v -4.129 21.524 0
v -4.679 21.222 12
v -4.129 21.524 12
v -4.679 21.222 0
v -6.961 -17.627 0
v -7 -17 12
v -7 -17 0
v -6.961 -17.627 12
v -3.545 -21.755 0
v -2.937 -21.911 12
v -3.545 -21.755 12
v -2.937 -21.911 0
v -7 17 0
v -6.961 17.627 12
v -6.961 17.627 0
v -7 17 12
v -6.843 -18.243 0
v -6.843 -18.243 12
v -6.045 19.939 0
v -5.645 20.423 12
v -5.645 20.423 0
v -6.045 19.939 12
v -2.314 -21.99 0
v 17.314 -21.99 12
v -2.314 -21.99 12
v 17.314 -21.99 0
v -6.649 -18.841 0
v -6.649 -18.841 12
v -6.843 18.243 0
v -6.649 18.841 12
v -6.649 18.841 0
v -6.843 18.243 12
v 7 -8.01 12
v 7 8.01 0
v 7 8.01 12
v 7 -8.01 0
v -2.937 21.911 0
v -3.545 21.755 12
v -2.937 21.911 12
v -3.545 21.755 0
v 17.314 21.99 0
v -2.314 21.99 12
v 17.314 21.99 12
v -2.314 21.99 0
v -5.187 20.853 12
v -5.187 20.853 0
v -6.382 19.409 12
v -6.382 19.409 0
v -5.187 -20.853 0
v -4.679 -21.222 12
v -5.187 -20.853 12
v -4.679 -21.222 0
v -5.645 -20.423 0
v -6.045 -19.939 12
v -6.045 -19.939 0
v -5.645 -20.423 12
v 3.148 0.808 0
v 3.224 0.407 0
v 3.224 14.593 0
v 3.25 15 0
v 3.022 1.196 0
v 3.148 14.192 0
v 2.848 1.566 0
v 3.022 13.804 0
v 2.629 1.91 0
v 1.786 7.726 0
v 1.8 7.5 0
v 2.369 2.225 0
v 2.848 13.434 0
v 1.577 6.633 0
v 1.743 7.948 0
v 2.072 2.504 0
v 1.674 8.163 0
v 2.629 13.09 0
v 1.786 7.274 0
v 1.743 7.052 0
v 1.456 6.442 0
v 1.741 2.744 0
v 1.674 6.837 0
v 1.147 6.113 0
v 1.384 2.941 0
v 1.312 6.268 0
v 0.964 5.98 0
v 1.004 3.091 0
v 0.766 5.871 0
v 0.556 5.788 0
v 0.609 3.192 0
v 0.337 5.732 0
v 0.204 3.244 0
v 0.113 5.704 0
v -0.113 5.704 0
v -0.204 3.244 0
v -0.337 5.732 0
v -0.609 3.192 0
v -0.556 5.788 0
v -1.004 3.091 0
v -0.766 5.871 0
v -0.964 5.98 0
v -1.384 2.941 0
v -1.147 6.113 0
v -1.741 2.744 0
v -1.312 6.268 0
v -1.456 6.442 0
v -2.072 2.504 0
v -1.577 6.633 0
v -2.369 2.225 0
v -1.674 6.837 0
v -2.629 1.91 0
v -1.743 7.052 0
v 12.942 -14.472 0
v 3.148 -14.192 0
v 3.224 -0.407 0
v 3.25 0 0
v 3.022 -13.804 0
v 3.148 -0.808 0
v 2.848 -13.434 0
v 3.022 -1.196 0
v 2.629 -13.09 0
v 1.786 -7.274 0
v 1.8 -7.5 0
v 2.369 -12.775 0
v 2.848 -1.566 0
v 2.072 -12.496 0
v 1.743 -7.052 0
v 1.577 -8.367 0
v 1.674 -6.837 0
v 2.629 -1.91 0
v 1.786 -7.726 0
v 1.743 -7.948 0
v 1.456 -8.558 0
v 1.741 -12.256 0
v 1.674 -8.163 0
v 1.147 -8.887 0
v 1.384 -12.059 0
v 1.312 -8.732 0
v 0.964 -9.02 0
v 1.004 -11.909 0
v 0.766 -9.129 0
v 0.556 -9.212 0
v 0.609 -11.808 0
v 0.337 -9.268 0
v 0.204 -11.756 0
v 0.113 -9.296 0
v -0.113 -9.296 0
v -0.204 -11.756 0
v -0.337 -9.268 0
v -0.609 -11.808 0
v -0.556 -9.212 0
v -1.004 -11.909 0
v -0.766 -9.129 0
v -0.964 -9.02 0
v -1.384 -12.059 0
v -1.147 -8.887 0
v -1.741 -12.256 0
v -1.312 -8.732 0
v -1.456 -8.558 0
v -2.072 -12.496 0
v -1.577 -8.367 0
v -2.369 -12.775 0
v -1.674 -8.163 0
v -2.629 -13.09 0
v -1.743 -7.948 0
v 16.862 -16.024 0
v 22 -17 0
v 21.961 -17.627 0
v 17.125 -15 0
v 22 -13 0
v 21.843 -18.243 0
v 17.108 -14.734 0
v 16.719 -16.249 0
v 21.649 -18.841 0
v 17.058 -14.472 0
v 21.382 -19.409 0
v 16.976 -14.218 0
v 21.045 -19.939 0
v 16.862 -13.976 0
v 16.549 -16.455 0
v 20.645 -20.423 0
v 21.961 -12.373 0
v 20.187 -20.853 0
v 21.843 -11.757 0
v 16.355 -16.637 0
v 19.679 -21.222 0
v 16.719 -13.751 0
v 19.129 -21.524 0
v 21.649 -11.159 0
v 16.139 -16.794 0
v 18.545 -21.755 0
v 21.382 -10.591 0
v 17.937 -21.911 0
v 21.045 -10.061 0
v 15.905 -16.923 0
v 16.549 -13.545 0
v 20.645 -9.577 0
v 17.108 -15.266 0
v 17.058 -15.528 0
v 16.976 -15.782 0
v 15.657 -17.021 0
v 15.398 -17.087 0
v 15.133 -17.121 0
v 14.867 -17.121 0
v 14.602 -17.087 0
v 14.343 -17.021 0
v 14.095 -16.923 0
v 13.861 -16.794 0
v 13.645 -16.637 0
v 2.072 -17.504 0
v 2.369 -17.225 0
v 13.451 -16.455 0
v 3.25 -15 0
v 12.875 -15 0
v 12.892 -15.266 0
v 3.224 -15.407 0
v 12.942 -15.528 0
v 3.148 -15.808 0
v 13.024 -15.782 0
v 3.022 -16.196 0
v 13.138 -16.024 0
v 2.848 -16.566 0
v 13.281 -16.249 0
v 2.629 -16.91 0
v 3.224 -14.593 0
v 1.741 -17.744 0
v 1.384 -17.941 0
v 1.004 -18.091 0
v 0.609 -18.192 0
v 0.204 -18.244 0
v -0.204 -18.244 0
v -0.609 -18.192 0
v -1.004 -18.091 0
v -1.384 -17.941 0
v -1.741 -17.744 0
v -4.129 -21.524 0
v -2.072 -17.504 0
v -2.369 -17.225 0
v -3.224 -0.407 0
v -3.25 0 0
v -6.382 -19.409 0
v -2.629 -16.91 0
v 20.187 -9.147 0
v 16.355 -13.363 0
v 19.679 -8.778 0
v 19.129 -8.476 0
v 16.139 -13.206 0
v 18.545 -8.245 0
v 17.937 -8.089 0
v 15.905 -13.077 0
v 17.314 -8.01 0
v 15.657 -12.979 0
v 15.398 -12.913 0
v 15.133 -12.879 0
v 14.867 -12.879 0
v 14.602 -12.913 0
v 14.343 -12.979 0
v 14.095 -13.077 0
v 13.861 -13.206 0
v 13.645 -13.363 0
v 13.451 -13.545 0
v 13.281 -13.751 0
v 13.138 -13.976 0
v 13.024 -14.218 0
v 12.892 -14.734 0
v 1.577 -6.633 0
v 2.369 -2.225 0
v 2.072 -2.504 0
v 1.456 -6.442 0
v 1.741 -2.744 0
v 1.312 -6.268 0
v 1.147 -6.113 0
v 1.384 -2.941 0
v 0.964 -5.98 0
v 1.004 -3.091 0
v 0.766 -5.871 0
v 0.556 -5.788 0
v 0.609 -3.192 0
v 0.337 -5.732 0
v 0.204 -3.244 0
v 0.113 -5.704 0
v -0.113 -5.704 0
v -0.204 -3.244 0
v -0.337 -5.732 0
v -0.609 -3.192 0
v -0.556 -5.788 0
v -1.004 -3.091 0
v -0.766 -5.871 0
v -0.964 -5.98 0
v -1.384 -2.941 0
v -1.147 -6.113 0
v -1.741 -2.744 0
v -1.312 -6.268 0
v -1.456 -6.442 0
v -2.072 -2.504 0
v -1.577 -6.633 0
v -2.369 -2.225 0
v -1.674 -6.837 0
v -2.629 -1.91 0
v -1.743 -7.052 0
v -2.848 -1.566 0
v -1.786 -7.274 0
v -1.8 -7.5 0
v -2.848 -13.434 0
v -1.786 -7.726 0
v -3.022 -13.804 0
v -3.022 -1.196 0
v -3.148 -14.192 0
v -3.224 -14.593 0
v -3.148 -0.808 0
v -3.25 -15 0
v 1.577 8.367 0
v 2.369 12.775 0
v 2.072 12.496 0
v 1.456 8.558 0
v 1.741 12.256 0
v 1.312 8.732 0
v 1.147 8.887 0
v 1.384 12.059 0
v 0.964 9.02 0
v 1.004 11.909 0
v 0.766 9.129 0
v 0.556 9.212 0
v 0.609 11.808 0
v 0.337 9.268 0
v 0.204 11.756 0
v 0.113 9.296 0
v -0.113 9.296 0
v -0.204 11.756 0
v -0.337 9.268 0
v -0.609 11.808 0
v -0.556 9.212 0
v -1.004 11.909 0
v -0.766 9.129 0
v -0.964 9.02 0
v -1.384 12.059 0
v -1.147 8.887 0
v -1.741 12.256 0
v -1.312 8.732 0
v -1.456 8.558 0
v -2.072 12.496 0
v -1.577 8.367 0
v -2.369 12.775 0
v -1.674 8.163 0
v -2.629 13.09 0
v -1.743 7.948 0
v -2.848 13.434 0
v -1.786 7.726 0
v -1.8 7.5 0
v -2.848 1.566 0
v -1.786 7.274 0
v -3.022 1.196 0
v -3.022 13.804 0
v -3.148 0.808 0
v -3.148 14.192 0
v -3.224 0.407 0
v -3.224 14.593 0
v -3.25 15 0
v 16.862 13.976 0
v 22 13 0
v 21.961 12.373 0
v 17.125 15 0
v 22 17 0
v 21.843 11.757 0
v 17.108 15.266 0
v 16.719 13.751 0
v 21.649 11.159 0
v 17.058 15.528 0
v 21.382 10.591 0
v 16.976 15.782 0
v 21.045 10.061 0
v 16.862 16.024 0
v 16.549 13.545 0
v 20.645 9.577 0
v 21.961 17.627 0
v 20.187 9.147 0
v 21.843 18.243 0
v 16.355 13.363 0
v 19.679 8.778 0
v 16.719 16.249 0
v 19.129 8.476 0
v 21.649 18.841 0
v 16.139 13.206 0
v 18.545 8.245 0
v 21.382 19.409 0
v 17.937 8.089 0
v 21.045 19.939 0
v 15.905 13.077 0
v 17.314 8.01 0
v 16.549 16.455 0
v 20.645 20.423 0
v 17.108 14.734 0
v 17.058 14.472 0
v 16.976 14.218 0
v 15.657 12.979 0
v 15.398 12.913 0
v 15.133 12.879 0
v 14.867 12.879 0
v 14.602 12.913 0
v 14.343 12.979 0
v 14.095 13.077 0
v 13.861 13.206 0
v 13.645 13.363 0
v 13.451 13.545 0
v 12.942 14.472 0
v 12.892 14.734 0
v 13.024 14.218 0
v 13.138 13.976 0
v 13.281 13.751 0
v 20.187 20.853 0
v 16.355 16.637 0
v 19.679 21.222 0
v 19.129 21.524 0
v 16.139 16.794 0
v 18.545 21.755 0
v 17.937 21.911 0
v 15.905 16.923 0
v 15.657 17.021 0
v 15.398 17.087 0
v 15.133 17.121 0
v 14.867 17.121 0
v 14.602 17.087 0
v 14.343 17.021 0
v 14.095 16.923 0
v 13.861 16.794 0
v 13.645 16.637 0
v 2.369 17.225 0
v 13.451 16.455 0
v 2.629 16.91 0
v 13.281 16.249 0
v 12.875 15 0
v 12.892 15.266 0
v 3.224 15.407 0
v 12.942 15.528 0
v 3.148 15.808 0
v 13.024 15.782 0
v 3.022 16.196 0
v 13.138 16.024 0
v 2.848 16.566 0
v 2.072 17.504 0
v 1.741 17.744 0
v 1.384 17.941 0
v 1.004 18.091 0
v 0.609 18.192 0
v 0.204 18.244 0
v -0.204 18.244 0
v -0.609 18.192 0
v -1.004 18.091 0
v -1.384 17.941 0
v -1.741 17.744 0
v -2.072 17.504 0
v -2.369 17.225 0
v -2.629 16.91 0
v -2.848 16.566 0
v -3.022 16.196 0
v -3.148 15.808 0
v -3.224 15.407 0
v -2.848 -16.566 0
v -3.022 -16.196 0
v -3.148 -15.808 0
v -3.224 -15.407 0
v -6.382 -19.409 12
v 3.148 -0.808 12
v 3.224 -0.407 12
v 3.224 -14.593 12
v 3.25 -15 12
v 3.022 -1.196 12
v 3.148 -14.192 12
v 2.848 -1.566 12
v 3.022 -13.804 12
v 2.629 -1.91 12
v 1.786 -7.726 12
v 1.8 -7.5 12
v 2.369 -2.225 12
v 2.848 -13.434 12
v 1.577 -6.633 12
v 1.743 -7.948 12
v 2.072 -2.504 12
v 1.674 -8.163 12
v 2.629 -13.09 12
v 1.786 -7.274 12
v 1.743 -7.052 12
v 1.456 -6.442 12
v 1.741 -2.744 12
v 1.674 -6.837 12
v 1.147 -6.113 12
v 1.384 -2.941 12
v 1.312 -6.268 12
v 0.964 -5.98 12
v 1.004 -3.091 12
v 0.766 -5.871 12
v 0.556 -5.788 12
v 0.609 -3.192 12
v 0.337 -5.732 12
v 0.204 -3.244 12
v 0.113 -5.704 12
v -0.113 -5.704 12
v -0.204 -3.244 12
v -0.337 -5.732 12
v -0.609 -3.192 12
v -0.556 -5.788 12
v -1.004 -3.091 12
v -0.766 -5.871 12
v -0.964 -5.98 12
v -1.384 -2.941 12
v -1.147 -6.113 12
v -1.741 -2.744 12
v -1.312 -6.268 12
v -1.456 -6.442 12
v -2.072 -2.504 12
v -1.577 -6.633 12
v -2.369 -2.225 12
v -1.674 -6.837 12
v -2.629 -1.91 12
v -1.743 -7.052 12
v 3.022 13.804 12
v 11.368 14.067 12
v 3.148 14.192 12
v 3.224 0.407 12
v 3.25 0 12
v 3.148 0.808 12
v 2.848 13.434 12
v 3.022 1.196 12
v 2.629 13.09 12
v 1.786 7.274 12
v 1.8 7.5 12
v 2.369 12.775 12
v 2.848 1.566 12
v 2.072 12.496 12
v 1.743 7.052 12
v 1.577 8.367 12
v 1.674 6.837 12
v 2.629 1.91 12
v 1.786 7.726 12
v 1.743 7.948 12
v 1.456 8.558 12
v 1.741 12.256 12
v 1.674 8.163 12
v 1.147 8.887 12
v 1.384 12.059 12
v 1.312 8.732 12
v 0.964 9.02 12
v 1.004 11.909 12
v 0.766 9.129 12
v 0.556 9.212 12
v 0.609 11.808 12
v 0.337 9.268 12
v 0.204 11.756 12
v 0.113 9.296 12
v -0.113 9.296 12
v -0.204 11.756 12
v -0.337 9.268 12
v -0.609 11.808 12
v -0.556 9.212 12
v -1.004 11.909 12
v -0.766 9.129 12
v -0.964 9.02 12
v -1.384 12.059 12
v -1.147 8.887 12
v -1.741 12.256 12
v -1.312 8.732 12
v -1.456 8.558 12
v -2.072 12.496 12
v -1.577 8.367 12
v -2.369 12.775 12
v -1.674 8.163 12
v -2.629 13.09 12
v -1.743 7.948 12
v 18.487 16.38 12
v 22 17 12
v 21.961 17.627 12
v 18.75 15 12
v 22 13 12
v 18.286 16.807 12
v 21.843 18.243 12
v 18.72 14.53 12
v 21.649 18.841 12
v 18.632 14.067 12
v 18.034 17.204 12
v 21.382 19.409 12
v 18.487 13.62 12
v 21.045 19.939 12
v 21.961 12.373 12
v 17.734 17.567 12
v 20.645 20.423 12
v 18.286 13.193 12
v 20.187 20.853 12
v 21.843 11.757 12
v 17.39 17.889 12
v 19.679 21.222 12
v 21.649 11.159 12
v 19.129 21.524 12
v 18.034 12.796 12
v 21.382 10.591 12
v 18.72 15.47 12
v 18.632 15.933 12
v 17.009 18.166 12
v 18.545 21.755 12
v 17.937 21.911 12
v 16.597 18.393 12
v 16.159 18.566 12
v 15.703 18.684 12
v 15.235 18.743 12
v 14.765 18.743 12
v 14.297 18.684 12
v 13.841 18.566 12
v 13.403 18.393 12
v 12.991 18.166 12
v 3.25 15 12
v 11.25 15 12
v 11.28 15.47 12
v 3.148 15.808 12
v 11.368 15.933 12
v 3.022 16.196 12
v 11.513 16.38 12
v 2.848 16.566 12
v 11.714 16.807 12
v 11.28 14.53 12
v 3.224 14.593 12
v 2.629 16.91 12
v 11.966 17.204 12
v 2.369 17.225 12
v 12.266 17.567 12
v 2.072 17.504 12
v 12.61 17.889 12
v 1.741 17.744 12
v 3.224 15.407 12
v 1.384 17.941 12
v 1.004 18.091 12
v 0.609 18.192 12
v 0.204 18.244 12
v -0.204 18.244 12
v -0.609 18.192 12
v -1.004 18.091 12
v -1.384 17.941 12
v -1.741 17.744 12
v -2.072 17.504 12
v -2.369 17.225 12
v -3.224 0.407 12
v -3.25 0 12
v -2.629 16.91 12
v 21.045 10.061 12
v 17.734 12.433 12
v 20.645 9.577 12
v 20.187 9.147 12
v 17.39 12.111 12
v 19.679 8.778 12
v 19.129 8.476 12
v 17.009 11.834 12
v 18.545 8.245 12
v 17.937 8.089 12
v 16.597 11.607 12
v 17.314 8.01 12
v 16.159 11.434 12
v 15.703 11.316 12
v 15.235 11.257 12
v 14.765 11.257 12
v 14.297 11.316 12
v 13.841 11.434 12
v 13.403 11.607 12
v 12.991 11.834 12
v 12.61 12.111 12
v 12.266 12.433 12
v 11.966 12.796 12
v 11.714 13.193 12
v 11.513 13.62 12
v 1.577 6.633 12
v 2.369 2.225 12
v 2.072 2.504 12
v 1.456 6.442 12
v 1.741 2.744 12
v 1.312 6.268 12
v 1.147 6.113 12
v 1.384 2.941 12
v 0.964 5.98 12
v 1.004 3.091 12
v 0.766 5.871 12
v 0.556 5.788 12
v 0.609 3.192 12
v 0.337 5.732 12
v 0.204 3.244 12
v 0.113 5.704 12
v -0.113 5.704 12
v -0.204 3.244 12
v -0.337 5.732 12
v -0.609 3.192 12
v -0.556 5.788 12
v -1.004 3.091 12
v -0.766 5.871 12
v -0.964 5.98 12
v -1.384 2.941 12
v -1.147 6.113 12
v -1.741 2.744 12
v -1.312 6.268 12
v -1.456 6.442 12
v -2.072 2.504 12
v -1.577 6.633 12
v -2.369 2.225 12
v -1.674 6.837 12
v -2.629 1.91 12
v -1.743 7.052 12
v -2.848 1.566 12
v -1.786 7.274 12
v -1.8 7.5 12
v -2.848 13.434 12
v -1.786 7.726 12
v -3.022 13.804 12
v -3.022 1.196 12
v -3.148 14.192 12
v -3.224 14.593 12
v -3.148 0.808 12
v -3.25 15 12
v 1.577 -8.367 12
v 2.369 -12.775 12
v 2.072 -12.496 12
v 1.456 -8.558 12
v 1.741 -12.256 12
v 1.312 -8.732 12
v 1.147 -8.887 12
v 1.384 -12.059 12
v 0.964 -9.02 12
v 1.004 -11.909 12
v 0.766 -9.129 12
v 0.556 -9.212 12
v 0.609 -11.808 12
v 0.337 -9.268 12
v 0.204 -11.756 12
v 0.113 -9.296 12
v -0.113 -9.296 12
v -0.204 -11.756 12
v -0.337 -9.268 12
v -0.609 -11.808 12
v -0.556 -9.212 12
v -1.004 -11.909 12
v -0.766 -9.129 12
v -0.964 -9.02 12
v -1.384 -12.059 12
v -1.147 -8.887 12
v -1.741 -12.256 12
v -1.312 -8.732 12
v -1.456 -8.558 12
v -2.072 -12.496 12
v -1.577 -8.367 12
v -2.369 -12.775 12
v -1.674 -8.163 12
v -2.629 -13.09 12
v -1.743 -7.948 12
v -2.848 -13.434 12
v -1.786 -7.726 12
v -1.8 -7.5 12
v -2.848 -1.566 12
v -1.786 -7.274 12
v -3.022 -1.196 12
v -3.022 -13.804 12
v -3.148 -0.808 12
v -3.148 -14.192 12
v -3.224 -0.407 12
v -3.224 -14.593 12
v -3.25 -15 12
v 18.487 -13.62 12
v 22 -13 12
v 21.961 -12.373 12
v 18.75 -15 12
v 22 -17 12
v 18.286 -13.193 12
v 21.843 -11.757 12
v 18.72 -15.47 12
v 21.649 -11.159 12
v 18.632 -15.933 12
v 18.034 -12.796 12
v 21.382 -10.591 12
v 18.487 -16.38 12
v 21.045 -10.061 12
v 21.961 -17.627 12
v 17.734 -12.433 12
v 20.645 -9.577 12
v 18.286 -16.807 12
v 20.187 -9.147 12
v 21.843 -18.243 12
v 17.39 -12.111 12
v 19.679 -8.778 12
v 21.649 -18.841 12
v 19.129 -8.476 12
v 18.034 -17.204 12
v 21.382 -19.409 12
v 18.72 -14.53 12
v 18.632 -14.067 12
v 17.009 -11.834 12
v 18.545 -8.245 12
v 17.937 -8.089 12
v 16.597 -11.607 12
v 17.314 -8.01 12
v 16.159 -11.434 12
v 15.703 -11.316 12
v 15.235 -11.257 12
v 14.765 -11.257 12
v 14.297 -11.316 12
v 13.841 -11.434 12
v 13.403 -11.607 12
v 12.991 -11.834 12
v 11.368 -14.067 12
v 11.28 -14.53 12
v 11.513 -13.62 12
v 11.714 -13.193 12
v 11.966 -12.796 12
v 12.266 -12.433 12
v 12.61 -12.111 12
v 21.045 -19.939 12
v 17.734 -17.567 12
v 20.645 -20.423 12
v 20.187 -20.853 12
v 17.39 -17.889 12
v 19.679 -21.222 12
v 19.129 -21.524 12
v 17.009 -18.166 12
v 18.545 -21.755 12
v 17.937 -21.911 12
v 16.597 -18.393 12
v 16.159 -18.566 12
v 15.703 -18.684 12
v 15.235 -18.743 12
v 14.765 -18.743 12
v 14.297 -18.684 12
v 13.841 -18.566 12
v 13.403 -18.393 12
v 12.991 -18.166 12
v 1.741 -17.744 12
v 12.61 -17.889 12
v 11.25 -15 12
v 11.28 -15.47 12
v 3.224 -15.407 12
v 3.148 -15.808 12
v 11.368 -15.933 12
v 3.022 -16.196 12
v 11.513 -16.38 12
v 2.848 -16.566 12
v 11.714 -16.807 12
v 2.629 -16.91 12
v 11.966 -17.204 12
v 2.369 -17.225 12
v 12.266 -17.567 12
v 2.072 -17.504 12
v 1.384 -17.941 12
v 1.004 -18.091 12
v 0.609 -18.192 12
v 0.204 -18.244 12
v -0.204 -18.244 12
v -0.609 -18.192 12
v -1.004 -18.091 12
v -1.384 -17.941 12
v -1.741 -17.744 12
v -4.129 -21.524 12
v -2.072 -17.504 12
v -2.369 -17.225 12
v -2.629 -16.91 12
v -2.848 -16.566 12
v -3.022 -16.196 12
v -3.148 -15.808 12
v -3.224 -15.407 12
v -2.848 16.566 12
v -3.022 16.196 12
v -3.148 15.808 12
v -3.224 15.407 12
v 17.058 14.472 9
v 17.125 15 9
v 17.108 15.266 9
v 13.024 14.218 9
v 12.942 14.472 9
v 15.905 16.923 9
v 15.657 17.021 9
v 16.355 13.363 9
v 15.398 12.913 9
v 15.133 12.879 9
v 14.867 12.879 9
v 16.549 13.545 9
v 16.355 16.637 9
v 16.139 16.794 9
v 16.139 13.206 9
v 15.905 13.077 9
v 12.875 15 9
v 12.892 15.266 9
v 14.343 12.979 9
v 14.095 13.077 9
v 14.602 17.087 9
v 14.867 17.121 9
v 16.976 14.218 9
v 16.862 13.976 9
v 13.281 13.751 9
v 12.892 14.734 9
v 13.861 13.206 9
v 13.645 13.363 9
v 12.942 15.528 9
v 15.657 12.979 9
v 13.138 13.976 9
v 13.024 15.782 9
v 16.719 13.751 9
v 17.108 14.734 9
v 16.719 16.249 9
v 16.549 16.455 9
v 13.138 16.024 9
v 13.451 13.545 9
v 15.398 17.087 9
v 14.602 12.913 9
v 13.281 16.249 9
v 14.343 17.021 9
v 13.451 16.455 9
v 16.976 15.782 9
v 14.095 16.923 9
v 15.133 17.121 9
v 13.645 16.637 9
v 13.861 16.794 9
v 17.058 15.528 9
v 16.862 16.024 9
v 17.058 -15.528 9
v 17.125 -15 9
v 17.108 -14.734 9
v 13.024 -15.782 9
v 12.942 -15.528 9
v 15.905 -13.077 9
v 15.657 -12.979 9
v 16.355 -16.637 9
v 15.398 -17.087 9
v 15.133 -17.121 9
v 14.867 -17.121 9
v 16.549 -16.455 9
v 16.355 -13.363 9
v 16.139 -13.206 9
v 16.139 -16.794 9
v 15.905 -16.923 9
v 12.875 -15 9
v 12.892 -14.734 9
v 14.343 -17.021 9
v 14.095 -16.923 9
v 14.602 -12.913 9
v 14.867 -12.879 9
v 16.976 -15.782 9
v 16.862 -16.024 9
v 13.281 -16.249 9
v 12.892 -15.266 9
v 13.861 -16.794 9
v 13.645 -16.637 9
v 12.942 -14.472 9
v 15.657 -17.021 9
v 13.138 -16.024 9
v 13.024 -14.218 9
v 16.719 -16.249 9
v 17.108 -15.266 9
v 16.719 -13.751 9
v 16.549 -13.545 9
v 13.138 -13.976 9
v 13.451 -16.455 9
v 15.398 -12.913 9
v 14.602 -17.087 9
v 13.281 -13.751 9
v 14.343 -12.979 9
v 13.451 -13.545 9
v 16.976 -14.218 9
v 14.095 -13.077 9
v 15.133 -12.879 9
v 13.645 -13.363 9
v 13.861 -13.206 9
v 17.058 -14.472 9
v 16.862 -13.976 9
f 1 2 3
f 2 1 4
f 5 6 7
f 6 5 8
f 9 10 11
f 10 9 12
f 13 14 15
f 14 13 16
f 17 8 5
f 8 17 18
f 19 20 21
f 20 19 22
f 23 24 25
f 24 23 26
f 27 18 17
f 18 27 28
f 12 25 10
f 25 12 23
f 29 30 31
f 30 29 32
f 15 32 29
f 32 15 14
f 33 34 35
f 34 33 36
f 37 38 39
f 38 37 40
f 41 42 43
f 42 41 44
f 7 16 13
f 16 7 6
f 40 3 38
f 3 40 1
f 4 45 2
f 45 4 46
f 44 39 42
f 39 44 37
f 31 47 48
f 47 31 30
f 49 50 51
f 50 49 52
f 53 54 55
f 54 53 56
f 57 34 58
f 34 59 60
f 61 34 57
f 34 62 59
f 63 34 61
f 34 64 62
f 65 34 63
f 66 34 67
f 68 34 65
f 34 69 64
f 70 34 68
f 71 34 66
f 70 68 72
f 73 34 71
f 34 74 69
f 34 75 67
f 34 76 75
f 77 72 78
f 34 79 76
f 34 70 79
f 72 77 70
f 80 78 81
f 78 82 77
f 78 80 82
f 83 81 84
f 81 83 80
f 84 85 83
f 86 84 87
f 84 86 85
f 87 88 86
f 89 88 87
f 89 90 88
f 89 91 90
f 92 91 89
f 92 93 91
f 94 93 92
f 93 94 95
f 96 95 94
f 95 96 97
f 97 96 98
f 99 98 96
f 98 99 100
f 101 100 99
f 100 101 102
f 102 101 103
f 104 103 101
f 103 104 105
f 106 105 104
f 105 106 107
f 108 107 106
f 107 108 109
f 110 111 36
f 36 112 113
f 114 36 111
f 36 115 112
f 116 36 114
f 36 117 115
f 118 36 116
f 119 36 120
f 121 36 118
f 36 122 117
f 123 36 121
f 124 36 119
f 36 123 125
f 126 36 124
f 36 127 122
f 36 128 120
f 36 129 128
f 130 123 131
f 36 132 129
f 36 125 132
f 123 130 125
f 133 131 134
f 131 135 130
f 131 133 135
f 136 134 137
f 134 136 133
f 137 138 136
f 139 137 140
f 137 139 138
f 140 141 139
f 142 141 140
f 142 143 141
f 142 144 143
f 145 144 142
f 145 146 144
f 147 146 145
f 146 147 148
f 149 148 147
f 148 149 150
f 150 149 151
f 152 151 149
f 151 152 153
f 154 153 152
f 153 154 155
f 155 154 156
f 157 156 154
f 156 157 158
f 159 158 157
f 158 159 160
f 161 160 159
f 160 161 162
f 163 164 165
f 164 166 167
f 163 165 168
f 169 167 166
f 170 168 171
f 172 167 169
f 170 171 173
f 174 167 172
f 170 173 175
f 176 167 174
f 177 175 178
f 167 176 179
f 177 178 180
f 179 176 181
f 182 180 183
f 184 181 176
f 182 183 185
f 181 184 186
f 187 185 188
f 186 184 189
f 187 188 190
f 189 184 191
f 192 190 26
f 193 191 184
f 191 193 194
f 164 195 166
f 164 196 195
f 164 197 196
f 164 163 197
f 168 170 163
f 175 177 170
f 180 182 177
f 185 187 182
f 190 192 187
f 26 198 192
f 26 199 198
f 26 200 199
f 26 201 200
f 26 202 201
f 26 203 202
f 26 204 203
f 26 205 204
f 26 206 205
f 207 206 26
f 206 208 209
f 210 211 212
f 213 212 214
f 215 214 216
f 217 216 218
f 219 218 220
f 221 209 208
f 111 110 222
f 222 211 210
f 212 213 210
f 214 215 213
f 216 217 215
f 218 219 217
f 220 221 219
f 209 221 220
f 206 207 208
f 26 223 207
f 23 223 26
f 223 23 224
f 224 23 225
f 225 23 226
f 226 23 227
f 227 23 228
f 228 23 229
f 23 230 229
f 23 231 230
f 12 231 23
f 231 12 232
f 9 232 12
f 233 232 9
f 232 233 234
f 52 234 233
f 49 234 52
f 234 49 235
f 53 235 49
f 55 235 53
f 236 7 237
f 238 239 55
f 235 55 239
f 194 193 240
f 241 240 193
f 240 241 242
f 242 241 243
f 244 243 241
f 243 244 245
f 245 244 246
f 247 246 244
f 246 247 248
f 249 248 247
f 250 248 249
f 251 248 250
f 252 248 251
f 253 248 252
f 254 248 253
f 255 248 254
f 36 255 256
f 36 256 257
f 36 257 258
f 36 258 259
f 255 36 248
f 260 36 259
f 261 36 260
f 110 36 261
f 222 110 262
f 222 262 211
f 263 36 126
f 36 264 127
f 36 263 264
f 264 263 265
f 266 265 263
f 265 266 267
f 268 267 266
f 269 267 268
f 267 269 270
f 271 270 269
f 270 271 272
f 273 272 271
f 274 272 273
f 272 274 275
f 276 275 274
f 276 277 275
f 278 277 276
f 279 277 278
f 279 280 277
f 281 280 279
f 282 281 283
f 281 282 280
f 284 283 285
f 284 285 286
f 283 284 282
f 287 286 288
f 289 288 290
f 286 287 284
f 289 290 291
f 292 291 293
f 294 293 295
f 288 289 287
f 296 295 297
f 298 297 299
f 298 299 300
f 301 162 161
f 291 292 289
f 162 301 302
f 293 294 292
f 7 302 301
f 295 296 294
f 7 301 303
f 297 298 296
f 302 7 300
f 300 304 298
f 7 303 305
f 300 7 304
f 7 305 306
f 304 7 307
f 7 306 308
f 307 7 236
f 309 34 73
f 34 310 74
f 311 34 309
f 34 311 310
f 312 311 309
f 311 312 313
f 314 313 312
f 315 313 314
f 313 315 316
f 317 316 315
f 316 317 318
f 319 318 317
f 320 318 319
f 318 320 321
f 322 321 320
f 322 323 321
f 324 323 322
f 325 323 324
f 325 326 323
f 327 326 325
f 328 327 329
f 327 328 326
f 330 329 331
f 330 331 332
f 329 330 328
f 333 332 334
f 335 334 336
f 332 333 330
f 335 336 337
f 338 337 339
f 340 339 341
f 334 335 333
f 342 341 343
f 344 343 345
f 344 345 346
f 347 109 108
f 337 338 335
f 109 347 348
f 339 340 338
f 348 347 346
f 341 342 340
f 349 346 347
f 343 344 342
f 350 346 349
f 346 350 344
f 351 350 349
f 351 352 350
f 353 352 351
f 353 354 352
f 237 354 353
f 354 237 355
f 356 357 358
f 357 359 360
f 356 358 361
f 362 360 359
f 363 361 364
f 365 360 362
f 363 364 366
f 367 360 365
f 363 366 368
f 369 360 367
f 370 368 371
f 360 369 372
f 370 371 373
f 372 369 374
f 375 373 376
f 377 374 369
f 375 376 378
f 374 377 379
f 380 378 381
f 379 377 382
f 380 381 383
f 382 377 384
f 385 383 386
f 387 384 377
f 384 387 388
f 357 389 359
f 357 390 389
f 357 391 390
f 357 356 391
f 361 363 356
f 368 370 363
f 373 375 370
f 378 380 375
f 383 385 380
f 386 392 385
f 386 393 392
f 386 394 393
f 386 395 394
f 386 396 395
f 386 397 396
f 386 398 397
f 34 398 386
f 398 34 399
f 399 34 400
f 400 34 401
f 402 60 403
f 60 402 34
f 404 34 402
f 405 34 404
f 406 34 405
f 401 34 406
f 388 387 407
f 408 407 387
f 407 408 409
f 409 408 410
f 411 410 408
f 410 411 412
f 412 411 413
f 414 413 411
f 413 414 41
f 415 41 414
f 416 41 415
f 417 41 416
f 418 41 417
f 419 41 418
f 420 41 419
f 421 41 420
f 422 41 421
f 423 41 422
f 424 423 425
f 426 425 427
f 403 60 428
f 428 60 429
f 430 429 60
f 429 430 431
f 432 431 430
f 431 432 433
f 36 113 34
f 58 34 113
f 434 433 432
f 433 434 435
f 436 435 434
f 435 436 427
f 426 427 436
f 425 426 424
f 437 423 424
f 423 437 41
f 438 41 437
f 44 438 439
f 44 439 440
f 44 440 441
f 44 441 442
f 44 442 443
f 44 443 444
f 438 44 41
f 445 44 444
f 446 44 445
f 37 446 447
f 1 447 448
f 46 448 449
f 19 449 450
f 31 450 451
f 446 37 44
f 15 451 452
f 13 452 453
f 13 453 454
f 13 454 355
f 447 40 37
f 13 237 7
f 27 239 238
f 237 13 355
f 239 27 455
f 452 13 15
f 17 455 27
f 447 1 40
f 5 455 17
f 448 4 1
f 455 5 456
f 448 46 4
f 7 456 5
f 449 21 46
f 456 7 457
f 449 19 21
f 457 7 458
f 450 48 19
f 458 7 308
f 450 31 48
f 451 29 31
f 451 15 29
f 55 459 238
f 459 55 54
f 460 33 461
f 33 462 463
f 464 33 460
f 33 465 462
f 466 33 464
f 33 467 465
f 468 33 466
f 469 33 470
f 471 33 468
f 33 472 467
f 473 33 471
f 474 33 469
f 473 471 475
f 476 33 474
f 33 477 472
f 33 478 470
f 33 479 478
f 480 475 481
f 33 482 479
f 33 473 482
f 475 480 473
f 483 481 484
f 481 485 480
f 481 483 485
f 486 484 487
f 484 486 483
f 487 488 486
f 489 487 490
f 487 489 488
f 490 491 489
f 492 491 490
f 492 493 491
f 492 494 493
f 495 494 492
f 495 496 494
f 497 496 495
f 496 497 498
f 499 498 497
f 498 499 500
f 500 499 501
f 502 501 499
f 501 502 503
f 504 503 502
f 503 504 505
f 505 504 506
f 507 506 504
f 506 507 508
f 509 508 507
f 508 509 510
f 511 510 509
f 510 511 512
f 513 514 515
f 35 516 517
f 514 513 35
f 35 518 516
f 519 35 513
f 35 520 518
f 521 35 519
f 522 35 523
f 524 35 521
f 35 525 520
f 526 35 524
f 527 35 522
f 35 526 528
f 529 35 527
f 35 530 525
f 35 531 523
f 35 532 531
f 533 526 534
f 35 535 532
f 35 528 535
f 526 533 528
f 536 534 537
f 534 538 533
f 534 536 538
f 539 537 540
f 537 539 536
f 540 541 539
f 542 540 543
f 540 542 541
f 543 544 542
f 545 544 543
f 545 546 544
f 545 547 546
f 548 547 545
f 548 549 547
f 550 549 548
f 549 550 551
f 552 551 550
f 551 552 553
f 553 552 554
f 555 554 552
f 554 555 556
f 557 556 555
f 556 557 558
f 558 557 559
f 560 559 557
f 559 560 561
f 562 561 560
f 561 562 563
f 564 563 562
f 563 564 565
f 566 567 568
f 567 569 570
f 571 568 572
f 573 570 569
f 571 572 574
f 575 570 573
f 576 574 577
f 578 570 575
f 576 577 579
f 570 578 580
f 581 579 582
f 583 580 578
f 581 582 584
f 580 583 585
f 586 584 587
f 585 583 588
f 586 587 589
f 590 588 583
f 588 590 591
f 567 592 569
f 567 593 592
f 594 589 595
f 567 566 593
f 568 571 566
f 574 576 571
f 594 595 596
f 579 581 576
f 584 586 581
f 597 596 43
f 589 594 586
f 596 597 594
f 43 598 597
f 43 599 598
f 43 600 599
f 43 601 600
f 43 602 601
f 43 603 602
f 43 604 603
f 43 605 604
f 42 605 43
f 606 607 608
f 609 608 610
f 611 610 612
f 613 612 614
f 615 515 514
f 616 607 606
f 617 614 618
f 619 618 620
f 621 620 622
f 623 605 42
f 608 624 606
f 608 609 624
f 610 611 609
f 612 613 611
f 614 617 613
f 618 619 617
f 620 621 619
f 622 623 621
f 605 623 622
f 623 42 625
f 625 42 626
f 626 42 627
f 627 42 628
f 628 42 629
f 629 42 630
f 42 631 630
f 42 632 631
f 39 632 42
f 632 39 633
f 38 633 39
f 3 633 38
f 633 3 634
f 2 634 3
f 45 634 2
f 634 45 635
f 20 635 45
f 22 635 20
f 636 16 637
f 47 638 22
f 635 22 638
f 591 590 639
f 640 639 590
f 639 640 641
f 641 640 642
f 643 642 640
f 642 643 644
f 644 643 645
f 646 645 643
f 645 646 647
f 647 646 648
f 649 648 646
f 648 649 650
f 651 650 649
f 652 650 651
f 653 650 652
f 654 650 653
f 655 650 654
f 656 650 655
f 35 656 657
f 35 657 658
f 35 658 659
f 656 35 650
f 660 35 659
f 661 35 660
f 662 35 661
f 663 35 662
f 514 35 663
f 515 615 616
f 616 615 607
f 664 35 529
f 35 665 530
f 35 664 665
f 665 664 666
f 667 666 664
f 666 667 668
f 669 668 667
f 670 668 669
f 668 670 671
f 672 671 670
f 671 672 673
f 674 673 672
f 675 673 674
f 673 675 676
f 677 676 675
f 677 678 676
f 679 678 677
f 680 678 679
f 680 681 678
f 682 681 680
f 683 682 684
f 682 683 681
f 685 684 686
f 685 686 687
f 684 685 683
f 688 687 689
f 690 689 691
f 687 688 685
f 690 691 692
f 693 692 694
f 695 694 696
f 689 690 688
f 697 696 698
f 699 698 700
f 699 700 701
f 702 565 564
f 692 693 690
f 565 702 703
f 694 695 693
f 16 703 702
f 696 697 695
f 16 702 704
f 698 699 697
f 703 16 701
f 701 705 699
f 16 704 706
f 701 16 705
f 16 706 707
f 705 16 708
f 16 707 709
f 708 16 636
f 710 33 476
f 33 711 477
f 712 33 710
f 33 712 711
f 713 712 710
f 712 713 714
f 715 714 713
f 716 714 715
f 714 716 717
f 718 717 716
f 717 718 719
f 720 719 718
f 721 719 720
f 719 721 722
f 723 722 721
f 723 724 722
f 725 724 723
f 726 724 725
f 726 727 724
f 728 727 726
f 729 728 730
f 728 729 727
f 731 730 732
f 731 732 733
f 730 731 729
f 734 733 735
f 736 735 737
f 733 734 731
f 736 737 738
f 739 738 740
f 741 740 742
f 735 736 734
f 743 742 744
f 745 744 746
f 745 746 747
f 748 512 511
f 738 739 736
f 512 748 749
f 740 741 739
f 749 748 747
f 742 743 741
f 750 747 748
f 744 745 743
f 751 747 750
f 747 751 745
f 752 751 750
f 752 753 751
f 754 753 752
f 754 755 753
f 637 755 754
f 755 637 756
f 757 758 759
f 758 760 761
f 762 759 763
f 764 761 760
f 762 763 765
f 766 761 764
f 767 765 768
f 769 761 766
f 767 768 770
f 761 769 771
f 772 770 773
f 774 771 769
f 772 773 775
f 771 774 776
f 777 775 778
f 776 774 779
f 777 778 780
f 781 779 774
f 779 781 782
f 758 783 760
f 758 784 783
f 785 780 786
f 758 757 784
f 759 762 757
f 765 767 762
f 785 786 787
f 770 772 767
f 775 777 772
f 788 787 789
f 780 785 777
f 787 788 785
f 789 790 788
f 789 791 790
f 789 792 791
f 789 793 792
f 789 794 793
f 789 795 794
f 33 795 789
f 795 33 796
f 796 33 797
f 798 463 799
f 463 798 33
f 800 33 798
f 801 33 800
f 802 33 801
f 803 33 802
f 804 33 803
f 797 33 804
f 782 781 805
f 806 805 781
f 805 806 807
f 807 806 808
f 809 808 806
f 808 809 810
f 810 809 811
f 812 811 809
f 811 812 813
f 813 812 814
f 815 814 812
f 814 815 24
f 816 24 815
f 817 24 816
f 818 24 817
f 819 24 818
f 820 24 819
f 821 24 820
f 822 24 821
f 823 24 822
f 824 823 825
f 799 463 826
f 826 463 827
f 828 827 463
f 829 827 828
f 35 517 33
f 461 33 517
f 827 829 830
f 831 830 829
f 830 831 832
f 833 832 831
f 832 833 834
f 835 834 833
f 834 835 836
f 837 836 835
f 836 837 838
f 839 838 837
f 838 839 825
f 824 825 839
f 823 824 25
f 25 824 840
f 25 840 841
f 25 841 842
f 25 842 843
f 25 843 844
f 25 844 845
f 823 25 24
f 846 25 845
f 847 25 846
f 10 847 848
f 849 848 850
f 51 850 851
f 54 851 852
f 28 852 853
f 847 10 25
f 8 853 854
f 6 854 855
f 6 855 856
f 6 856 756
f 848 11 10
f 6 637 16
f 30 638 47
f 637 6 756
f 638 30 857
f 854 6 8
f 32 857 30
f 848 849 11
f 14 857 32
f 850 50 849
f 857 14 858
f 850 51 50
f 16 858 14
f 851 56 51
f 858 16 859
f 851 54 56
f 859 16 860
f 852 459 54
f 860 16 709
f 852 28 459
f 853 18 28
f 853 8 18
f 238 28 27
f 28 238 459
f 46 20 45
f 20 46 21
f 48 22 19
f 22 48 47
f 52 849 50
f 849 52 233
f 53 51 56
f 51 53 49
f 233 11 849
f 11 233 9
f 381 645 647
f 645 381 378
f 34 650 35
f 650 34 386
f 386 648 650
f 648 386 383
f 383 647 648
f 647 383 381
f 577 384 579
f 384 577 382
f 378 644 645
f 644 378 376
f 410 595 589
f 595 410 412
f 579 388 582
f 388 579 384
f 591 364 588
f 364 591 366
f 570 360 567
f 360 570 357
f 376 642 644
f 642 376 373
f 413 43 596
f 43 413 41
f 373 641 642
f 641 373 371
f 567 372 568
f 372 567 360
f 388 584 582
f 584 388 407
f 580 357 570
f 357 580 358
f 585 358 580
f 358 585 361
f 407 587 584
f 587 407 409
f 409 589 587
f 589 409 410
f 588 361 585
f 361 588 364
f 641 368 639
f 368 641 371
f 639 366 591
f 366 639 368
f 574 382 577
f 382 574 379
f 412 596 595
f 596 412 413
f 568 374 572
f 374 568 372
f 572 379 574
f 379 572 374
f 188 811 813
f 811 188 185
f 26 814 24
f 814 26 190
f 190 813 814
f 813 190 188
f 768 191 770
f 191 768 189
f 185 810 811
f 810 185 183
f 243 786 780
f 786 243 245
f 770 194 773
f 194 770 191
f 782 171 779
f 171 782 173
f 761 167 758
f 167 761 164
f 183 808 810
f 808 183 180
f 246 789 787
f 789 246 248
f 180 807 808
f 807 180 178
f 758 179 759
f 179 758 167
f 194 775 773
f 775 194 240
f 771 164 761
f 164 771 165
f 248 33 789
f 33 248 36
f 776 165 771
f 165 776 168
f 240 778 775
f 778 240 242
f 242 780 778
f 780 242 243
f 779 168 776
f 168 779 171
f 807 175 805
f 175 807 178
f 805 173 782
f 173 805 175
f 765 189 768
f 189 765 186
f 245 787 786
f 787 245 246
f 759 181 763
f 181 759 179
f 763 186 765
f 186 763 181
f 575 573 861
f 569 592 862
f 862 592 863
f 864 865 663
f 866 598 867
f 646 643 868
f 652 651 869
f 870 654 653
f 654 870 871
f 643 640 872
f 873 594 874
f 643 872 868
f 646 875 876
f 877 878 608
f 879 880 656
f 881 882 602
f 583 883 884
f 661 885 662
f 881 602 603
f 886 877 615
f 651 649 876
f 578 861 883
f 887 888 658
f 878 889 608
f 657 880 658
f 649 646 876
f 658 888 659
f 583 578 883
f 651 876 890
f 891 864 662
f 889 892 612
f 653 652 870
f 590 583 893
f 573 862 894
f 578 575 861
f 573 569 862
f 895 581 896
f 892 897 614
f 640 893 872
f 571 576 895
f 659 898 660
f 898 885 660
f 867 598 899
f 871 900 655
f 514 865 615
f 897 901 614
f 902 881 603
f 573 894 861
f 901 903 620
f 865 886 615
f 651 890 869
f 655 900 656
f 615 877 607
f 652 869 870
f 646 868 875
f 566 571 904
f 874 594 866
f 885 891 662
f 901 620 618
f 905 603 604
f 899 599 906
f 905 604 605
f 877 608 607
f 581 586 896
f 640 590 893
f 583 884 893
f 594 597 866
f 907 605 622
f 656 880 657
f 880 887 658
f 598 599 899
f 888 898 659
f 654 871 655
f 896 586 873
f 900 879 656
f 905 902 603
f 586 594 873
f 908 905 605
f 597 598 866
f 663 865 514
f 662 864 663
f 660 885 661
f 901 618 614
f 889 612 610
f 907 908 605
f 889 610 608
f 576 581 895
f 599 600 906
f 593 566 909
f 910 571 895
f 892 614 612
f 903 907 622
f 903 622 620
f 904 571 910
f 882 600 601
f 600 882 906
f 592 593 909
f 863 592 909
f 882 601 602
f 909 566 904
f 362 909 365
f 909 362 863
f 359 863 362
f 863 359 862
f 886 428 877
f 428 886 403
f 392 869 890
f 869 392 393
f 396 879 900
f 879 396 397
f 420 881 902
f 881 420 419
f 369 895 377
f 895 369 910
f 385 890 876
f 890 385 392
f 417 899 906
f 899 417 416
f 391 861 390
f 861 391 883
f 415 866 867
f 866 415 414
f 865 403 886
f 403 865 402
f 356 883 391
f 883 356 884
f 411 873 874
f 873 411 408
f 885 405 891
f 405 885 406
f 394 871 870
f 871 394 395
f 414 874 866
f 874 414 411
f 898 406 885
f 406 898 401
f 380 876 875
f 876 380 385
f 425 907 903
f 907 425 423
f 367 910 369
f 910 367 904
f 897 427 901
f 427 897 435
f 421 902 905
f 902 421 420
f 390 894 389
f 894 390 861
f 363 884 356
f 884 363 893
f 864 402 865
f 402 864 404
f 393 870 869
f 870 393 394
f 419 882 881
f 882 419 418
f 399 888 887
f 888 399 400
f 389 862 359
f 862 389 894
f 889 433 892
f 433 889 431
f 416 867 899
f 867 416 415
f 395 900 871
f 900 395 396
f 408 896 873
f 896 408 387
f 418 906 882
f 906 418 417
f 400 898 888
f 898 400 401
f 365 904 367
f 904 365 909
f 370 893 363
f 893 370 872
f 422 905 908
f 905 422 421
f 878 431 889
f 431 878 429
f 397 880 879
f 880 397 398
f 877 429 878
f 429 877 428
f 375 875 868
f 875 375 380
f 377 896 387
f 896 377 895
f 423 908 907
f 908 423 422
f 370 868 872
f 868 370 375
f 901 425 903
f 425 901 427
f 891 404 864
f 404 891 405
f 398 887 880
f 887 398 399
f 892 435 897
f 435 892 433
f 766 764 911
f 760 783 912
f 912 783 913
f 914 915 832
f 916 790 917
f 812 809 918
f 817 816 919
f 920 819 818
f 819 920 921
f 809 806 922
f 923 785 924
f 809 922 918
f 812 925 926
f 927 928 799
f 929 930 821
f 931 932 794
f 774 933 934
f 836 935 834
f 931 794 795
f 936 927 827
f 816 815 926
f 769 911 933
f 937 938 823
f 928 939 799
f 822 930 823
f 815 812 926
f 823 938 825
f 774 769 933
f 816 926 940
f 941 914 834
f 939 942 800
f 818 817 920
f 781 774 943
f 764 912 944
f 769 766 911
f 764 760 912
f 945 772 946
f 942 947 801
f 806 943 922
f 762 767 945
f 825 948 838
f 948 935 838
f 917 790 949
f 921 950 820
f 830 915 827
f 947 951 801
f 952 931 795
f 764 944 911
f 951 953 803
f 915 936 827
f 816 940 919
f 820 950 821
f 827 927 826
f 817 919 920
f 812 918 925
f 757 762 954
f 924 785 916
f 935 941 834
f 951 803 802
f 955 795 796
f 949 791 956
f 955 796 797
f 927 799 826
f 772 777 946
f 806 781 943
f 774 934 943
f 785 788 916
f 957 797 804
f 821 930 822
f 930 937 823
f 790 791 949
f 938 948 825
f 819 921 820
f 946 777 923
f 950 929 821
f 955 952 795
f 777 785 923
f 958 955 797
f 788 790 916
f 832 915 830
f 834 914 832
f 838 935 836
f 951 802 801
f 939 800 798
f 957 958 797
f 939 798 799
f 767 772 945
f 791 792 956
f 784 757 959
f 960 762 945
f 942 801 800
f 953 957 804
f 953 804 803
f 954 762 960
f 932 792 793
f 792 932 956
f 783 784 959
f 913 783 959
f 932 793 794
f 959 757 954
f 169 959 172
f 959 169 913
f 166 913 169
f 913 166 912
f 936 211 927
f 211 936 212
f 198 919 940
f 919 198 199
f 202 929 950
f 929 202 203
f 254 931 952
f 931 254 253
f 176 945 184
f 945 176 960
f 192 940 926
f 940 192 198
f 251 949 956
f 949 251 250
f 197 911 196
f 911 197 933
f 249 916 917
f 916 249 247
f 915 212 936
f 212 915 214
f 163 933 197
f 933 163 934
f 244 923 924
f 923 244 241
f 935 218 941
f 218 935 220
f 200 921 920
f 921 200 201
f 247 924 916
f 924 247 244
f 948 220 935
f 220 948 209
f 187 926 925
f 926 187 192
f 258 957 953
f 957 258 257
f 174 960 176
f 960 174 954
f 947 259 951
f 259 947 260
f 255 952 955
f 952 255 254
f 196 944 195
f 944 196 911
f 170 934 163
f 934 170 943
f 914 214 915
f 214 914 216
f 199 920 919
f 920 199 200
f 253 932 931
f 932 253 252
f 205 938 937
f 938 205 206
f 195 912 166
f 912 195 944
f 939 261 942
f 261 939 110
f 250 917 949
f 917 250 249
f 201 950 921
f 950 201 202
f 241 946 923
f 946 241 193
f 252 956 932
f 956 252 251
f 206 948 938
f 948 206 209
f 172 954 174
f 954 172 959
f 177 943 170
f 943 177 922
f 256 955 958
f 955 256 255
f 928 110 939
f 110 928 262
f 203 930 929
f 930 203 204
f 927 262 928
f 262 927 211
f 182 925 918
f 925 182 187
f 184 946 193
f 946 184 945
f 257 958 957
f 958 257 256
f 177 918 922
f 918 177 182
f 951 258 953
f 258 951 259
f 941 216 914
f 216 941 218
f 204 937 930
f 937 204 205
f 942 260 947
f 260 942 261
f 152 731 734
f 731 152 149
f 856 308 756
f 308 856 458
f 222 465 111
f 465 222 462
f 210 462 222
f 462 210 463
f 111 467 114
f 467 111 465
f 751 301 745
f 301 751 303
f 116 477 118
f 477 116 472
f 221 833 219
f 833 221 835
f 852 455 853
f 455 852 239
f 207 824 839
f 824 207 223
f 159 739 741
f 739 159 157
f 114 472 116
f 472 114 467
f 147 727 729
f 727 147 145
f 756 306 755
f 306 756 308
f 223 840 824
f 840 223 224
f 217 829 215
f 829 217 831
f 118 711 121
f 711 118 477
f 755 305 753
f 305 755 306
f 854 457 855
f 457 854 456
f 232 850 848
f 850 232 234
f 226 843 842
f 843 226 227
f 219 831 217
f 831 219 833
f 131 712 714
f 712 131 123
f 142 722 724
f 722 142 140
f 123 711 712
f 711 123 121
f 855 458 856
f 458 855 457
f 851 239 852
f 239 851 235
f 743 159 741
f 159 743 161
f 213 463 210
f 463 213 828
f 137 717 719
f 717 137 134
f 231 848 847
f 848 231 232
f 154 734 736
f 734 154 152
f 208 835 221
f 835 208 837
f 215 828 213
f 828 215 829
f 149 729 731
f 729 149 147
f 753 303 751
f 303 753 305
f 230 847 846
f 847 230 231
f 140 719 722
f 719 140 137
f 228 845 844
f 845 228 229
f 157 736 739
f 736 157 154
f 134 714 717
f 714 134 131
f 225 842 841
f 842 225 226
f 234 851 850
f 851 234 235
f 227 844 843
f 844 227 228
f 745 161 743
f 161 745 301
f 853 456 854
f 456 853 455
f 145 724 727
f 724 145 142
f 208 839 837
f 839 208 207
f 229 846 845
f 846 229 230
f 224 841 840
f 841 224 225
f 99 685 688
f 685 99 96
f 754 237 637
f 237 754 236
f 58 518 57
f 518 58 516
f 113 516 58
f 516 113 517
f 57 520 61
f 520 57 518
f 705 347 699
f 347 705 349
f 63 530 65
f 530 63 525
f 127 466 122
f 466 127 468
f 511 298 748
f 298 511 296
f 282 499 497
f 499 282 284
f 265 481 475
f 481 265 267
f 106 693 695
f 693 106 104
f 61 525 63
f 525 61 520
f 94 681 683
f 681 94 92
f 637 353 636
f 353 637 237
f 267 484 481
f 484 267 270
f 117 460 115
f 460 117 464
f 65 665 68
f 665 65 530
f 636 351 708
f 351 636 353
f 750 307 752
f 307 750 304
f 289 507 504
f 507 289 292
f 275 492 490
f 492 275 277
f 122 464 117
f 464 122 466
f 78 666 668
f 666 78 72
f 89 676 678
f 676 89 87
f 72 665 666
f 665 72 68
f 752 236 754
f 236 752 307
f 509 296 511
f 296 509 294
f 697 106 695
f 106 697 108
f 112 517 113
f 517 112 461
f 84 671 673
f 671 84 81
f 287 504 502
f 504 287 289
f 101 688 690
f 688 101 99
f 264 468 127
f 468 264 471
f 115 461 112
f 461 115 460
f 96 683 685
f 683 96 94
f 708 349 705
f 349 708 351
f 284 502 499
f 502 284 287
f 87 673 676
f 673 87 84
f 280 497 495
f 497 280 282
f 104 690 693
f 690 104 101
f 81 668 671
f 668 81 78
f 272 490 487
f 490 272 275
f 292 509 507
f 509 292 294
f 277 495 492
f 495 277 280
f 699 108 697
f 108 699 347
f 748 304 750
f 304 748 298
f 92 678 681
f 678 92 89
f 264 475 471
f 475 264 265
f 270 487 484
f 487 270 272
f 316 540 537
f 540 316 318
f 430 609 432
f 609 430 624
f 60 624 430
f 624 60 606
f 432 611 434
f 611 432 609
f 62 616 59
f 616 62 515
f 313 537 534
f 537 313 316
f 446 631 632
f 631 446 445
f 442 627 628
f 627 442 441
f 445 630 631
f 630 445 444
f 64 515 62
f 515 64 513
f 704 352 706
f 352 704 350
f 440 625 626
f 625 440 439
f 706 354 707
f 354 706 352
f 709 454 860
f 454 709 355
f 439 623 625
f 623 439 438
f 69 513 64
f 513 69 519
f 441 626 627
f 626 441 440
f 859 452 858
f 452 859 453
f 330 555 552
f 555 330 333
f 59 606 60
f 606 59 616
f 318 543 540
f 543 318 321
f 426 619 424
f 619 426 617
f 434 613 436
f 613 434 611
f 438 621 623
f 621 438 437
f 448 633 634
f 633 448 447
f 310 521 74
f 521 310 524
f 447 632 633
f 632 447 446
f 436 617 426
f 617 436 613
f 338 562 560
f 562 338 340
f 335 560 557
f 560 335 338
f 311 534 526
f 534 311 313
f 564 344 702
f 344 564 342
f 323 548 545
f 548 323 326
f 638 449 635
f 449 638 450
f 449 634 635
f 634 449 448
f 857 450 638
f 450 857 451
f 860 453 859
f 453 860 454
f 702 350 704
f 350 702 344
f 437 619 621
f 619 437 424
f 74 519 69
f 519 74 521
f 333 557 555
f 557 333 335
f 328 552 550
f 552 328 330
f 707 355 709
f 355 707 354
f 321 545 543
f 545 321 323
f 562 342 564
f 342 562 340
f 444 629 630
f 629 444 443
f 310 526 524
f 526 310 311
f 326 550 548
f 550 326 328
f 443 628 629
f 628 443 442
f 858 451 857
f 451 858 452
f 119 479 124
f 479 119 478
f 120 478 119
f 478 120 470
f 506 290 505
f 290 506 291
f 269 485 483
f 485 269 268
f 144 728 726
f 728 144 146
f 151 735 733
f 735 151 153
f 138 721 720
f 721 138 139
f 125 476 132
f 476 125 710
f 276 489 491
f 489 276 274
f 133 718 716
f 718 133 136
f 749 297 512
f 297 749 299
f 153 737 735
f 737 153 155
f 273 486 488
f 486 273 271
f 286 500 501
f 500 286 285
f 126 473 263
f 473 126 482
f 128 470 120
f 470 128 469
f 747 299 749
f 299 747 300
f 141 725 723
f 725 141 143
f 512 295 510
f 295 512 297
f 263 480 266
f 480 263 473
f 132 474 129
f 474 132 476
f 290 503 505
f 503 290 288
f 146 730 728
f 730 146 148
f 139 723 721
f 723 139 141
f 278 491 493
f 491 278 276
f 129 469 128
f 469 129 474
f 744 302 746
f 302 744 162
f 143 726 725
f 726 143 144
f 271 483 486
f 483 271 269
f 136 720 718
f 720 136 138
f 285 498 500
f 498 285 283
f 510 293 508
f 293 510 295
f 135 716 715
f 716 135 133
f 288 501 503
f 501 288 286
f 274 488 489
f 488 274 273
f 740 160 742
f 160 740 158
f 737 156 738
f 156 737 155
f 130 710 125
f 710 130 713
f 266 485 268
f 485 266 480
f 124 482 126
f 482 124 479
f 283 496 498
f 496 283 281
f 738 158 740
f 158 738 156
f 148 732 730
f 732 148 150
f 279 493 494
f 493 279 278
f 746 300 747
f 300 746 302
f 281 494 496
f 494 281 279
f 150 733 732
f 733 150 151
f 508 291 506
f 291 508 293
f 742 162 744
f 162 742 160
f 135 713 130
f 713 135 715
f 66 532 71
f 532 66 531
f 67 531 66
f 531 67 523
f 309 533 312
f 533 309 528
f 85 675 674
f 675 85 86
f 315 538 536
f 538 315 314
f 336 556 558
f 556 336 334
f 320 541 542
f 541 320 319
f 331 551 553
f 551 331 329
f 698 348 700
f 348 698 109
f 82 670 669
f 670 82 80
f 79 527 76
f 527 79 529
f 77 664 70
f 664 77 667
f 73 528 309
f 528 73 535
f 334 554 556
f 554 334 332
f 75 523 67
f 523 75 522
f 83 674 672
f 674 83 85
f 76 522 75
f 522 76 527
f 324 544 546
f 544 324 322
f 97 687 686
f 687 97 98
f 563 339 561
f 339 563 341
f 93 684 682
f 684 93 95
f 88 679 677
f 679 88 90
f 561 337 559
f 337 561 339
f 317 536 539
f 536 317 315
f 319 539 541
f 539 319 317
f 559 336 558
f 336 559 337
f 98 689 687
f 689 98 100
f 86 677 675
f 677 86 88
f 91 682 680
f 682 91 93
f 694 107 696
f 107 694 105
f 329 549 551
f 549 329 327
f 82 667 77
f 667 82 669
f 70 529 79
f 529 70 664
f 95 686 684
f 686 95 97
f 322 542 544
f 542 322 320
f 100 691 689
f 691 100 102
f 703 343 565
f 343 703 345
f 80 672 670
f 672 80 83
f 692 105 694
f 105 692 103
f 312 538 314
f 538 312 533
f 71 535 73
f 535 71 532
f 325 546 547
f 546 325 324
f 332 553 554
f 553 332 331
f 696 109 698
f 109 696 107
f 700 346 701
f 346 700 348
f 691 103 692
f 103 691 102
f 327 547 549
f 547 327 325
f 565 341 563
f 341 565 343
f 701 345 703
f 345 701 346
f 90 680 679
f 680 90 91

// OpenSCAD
$fn = 50;


difference() {
	union() {
		hull() {
			translate(v = [-2.0000000000, 17.0000000000, 0]) {
				cylinder(h = 12, r = 5);
			}
			translate(v = [2.0000000000, 17.0000000000, 0]) {
				cylinder(h = 12, r = 5);
			}
			translate(v = [-2.0000000000, -17.0000000000, 0]) {
				cylinder(h = 12, r = 5);
			}
			translate(v = [2.0000000000, -17.0000000000, 0]) {
				cylinder(h = 12, r = 5);
			}
		}
		translate(v = [7.5000000000, 15.0000000000, 0]) {
			hull() {
				translate(v = [-9.5000000000, 2.0000000000, 0]) {
					cylinder(h = 12, r = 5);
				}
				translate(v = [9.5000000000, 2.0000000000, 0]) {
					cylinder(h = 12, r = 5);
				}
				translate(v = [-9.5000000000, -2.0000000000, 0]) {
					cylinder(h = 12, r = 5);
				}
				translate(v = [9.5000000000, -2.0000000000, 0]) {
					cylinder(h = 12, r = 5);
				}
			}
		}
		translate(v = [7.5000000000, -15.0000000000, 0]) {
			hull() {
				translate(v = [-9.5000000000, 2.0000000000, 0]) {
					cylinder(h = 12, r = 5);
				}
				translate(v = [9.5000000000, 2.0000000000, 0]) {
					cylinder(h = 12, r = 5);
				}
				translate(v = [-9.5000000000, -2.0000000000, 0]) {
					cylinder(h = 12, r = 5);
				}
				translate(v = [9.5000000000, -2.0000000000, 0]) {
					cylinder(h = 12, r = 5);
				}
			}
		}
	}
	union() {
		translate(v = [15.0000000000, 15.0000000000, 12]) {
			rotate(a = [0, 0, 0]) {
				difference() {
					union() {
						#translate(v = [0, 0, -12.0000000000]) {
							cylinder(h = 12, r = 2.0000000000);
						}
						#translate(v = [0, 0, -3]) {
							cylinder(h = 3, r1 = 2.1250000000, r2 = 3.7500000000);
						}
						#translate(v = [0, 0, -12.0000000000]) {
							cylinder(h = 12, r = 2.1250000000);
						}
						#translate(v = [0, 0, -12.0000000000]) {
							cylinder(h = 12, r = 2.0000000000);
						}
					}
					union();
				}
			}
		}
		translate(v = [15.0000000000, -15.0000000000, 12]) {
			rotate(a = [0, 0, 0]) {
				difference() {
					union() {
						#translate(v = [0, 0, -12.0000000000]) {
							cylinder(h = 12, r = 2.0000000000);
						}
						#translate(v = [0, 0, -3]) {
							cylinder(h = 3, r1 = 2.1250000000, r2 = 3.7500000000);
						}
						#translate(v = [0, 0, -12.0000000000]) {
							cylinder(h = 12, r = 2.1250000000);
						}
						#translate(v = [0, 0, -12.0000000000]) {
							cylinder(h = 12, r = 2.0000000000);
						}
					}
					union();
				}
			}
		}
		translate(v = [0.0000000000, -15.0000000000, 0]) {
			translate(v = [0, 0, -100]) {
				cylinder(h = 200, r = 3.2500000000);
			}
		}
		translate(v = [0, 0, -100]) {
			cylinder(h = 200, r = 3.2500000000);
		}
		translate(v = [0.0000000000, 15.0000000000, 0]) {
			translate(v = [0, 0, -100]) {
				cylinder(h = 200, r = 3.2500000000);
			}
		}
		translate(v = [0.0000000000, -15.0000000000, 0]) {
			translate(v = [0, 0, -100]) {
				cylinder(h = 200, r = 1.8000000000);
			}
		}
		translate(v = [0.0000000000, -7.5000000000, 0]) {
			translate(v = [0, 0, -100]) {
				cylinder(h = 200, r = 1.8000000000);
			}
		}
		translate(v = [0, 0, -100]) {
			cylinder(h = 200, r = 1.8000000000);
		}
		translate(v = [0.0000000000, 7.5000000000, 0]) {
			translate(v = [0, 0, -100]) {
				cylinder(h = 200, r = 1.8000000000);
			}
		}
		translate(v = [0.0000000000, 15.0000000000, 0]) {
			translate(v = [0, 0, -100]) {
				cylinder(h = 200, r = 1.8000000000);
			}
		}
	}
}
